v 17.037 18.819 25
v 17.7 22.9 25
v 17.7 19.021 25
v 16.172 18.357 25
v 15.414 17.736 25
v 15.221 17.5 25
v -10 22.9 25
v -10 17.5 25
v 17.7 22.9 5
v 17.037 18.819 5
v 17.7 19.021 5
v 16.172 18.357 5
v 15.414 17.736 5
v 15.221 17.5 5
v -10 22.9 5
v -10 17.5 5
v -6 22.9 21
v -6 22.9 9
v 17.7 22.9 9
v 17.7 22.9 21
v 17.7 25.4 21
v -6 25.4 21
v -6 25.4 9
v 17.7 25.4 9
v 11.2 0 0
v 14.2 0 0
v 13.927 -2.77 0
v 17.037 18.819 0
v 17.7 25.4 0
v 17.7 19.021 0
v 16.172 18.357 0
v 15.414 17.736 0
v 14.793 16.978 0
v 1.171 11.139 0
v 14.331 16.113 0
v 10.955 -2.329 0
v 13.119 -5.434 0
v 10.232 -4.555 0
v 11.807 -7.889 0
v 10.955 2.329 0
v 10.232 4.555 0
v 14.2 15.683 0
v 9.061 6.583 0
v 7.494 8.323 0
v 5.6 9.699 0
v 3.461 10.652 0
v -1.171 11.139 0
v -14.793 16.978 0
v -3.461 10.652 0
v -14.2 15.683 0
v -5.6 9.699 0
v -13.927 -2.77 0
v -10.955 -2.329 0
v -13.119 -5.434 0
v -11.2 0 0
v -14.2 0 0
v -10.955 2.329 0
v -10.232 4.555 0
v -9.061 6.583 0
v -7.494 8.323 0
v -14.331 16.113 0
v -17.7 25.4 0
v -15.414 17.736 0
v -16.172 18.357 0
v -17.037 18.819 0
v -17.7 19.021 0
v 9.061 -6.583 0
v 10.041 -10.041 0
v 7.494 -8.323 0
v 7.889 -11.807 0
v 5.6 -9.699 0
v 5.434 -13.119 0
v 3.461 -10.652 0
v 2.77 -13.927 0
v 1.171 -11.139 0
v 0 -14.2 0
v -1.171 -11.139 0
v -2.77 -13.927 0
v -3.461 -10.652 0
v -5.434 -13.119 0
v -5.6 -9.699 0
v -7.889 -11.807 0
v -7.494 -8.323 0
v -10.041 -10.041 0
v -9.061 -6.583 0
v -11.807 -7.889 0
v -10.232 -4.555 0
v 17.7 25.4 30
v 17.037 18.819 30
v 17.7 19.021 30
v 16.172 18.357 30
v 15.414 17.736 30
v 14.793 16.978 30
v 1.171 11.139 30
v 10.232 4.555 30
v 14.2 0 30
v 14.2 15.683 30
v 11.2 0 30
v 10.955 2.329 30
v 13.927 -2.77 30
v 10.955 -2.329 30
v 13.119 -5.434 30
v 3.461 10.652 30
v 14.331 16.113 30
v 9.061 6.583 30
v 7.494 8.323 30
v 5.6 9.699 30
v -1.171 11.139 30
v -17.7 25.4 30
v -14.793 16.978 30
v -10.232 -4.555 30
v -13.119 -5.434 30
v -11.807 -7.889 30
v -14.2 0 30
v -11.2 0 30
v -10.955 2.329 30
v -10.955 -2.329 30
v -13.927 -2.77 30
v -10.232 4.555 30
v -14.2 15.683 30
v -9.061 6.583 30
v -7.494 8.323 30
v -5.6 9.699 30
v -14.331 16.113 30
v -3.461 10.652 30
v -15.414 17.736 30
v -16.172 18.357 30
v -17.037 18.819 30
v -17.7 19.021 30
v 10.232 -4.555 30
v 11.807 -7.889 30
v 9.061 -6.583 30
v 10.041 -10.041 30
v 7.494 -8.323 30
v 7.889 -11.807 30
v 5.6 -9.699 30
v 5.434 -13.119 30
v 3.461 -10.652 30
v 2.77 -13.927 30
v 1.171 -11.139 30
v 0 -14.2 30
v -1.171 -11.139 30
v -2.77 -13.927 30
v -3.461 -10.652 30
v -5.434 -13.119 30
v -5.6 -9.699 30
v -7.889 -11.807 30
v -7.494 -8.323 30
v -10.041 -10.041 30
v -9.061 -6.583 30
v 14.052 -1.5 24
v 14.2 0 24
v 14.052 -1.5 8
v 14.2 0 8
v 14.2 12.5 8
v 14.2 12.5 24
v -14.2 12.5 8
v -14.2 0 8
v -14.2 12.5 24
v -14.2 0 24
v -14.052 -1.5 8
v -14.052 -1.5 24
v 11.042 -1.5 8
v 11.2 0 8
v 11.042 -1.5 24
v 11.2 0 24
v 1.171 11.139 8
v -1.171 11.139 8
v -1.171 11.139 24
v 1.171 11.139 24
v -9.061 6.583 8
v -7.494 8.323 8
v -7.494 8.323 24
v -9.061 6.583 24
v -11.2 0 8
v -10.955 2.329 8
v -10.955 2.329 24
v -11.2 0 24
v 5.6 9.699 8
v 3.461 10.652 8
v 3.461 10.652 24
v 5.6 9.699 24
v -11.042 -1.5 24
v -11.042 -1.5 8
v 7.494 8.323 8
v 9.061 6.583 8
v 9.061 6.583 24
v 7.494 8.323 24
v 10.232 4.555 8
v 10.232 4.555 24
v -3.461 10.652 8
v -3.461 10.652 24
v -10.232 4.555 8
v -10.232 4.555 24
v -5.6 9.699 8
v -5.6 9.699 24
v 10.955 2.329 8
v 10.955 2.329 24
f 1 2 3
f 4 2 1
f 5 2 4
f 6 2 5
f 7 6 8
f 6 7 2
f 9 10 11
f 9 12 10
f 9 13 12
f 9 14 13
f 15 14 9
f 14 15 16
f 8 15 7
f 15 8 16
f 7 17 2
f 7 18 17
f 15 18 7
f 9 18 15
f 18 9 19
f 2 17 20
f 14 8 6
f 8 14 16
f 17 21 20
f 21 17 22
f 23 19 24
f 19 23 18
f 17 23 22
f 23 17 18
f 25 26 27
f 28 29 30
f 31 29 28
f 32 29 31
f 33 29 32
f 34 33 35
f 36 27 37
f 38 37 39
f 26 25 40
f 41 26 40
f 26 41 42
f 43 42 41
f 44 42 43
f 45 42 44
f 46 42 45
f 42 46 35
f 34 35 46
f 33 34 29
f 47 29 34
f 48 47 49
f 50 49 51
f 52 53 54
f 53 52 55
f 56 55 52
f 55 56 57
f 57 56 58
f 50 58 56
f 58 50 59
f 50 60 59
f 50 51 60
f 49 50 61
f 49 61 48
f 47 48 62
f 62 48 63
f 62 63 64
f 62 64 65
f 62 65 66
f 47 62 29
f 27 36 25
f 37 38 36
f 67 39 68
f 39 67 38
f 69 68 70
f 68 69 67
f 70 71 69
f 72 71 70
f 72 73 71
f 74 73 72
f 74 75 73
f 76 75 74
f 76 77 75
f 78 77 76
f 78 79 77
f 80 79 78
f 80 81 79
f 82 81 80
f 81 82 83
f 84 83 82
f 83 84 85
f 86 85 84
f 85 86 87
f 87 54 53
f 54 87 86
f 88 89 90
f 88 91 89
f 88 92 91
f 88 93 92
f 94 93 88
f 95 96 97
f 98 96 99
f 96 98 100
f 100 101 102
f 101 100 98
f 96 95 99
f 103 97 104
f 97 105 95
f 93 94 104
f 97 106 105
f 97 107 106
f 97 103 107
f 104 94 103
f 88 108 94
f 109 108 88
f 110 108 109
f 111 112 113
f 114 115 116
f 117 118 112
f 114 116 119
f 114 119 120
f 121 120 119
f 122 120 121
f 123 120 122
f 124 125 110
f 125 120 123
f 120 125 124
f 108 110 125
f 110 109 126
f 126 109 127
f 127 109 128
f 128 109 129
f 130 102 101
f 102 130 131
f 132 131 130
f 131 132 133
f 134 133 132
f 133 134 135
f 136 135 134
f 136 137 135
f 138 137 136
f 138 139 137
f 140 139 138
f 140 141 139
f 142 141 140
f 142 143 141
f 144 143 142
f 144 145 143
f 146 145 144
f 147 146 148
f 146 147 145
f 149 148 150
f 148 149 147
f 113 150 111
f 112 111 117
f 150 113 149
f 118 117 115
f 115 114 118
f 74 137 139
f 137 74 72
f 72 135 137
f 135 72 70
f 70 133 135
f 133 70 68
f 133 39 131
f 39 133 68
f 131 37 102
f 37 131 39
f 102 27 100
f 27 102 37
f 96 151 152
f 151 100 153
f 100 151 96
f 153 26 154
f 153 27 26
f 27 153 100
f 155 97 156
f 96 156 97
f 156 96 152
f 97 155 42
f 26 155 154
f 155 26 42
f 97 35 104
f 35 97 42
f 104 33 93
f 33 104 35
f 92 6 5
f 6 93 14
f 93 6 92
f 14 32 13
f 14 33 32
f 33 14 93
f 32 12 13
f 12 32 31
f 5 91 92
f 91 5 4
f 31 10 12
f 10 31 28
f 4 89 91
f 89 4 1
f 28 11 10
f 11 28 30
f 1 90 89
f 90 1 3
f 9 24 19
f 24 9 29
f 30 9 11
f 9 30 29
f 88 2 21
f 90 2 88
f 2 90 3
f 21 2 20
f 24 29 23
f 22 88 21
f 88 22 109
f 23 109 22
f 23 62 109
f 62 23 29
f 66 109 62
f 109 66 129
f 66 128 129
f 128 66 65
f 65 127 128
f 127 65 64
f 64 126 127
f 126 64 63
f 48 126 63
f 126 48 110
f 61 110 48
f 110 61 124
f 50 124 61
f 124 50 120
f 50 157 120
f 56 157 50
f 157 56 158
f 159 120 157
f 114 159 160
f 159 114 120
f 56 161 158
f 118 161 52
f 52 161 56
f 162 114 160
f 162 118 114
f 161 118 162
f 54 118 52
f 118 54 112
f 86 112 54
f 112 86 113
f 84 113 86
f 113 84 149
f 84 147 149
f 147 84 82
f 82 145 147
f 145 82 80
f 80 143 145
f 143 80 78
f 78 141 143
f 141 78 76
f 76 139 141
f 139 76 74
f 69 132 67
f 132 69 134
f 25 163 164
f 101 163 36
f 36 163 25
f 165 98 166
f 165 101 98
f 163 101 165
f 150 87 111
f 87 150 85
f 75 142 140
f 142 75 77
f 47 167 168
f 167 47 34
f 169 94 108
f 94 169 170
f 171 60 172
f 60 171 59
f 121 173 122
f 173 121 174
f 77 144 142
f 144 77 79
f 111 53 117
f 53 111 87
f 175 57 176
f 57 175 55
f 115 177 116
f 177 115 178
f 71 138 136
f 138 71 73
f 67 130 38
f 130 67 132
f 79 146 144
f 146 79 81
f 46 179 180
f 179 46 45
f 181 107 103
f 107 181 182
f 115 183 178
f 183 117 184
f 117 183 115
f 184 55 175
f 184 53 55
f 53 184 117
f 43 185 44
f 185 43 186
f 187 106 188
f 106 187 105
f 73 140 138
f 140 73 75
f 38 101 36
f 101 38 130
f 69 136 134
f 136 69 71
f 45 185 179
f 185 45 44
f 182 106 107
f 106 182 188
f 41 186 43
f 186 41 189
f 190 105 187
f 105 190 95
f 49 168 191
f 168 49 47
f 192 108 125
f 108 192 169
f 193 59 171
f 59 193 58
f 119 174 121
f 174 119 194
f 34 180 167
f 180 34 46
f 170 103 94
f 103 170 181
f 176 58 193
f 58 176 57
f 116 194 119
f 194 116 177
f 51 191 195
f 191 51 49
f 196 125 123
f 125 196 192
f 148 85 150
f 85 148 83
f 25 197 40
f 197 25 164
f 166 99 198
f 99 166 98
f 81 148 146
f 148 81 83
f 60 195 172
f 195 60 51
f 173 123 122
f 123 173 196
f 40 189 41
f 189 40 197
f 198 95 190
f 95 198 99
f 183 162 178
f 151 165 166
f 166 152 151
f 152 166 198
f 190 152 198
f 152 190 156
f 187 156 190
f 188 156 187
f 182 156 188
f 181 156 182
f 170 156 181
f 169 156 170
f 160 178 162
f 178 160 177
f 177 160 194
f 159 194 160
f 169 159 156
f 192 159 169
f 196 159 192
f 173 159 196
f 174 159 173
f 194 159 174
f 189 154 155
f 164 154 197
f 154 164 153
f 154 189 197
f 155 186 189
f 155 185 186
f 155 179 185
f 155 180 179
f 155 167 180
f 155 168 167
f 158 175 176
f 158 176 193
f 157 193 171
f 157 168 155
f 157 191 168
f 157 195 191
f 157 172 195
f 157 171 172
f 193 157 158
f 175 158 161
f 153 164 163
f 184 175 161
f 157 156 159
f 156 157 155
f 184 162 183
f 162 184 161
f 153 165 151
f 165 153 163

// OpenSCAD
module S2B_ring(
  baton_diameter=22 + .4, 
  outer_diameter=3
) {
  baton_r = baton_diameter/2;
  baton_r_outer = baton_r + outer_diameter;
  hull(){
    circle(r=baton_r_outer);    
    
    translate([-baton_r_outer, baton_r_outer + 9, 0])
      square([baton_r_outer*2, 2]);
  }
}

module S2B_handlebar_face(
  baton_diameter=22 + .4, 
  outer_diameter=3, 
  fillet_size=5
) {
  size = baton_diameter + outer_diameter + fillet_size * 2;
  
  difference() {
    translate([-size/2, baton_diameter/2 + outer_diameter, 0])
      square([size, baton_diameter/2]);
    
    translate([-size/2 - fillet_size/4, baton_diameter/2 + outer_diameter, 0])
    circle(r=fillet_size);
    
    translate([size/2 + fillet_size/4, baton_diameter/2 + outer_diameter, 0])
    circle(r=fillet_size);
  }
}

module S2B_holder_master(height=30) {
  linear_extrude(height=height)  
  union() {
    $fn=32;
    S2B_ring();
    S2B_handlebar_face();
  }
}

difference() {
  S2B_holder_master();
 
  // Baton space
  translate([0,0,-1])
  linear_extrude(height=32) 
    circle(r=22.4 / 2);
  
  // Middle cutout (zip-tie)
  translate([-20,-14 + 25/2, 8])
    cube([40,14,16]);
  
  // Adapter slot 
  union() {
    translate([-10, 20 - 5/2, 5])
      cube([40, 5 + .4, 20]); // 20 -.3 = fitting
    
    translate([-12/2, 20 + 5/2, (30 - 12)/2])
      cube([32, 6, 12]); // 12 -.3 = fitting
  }
}
